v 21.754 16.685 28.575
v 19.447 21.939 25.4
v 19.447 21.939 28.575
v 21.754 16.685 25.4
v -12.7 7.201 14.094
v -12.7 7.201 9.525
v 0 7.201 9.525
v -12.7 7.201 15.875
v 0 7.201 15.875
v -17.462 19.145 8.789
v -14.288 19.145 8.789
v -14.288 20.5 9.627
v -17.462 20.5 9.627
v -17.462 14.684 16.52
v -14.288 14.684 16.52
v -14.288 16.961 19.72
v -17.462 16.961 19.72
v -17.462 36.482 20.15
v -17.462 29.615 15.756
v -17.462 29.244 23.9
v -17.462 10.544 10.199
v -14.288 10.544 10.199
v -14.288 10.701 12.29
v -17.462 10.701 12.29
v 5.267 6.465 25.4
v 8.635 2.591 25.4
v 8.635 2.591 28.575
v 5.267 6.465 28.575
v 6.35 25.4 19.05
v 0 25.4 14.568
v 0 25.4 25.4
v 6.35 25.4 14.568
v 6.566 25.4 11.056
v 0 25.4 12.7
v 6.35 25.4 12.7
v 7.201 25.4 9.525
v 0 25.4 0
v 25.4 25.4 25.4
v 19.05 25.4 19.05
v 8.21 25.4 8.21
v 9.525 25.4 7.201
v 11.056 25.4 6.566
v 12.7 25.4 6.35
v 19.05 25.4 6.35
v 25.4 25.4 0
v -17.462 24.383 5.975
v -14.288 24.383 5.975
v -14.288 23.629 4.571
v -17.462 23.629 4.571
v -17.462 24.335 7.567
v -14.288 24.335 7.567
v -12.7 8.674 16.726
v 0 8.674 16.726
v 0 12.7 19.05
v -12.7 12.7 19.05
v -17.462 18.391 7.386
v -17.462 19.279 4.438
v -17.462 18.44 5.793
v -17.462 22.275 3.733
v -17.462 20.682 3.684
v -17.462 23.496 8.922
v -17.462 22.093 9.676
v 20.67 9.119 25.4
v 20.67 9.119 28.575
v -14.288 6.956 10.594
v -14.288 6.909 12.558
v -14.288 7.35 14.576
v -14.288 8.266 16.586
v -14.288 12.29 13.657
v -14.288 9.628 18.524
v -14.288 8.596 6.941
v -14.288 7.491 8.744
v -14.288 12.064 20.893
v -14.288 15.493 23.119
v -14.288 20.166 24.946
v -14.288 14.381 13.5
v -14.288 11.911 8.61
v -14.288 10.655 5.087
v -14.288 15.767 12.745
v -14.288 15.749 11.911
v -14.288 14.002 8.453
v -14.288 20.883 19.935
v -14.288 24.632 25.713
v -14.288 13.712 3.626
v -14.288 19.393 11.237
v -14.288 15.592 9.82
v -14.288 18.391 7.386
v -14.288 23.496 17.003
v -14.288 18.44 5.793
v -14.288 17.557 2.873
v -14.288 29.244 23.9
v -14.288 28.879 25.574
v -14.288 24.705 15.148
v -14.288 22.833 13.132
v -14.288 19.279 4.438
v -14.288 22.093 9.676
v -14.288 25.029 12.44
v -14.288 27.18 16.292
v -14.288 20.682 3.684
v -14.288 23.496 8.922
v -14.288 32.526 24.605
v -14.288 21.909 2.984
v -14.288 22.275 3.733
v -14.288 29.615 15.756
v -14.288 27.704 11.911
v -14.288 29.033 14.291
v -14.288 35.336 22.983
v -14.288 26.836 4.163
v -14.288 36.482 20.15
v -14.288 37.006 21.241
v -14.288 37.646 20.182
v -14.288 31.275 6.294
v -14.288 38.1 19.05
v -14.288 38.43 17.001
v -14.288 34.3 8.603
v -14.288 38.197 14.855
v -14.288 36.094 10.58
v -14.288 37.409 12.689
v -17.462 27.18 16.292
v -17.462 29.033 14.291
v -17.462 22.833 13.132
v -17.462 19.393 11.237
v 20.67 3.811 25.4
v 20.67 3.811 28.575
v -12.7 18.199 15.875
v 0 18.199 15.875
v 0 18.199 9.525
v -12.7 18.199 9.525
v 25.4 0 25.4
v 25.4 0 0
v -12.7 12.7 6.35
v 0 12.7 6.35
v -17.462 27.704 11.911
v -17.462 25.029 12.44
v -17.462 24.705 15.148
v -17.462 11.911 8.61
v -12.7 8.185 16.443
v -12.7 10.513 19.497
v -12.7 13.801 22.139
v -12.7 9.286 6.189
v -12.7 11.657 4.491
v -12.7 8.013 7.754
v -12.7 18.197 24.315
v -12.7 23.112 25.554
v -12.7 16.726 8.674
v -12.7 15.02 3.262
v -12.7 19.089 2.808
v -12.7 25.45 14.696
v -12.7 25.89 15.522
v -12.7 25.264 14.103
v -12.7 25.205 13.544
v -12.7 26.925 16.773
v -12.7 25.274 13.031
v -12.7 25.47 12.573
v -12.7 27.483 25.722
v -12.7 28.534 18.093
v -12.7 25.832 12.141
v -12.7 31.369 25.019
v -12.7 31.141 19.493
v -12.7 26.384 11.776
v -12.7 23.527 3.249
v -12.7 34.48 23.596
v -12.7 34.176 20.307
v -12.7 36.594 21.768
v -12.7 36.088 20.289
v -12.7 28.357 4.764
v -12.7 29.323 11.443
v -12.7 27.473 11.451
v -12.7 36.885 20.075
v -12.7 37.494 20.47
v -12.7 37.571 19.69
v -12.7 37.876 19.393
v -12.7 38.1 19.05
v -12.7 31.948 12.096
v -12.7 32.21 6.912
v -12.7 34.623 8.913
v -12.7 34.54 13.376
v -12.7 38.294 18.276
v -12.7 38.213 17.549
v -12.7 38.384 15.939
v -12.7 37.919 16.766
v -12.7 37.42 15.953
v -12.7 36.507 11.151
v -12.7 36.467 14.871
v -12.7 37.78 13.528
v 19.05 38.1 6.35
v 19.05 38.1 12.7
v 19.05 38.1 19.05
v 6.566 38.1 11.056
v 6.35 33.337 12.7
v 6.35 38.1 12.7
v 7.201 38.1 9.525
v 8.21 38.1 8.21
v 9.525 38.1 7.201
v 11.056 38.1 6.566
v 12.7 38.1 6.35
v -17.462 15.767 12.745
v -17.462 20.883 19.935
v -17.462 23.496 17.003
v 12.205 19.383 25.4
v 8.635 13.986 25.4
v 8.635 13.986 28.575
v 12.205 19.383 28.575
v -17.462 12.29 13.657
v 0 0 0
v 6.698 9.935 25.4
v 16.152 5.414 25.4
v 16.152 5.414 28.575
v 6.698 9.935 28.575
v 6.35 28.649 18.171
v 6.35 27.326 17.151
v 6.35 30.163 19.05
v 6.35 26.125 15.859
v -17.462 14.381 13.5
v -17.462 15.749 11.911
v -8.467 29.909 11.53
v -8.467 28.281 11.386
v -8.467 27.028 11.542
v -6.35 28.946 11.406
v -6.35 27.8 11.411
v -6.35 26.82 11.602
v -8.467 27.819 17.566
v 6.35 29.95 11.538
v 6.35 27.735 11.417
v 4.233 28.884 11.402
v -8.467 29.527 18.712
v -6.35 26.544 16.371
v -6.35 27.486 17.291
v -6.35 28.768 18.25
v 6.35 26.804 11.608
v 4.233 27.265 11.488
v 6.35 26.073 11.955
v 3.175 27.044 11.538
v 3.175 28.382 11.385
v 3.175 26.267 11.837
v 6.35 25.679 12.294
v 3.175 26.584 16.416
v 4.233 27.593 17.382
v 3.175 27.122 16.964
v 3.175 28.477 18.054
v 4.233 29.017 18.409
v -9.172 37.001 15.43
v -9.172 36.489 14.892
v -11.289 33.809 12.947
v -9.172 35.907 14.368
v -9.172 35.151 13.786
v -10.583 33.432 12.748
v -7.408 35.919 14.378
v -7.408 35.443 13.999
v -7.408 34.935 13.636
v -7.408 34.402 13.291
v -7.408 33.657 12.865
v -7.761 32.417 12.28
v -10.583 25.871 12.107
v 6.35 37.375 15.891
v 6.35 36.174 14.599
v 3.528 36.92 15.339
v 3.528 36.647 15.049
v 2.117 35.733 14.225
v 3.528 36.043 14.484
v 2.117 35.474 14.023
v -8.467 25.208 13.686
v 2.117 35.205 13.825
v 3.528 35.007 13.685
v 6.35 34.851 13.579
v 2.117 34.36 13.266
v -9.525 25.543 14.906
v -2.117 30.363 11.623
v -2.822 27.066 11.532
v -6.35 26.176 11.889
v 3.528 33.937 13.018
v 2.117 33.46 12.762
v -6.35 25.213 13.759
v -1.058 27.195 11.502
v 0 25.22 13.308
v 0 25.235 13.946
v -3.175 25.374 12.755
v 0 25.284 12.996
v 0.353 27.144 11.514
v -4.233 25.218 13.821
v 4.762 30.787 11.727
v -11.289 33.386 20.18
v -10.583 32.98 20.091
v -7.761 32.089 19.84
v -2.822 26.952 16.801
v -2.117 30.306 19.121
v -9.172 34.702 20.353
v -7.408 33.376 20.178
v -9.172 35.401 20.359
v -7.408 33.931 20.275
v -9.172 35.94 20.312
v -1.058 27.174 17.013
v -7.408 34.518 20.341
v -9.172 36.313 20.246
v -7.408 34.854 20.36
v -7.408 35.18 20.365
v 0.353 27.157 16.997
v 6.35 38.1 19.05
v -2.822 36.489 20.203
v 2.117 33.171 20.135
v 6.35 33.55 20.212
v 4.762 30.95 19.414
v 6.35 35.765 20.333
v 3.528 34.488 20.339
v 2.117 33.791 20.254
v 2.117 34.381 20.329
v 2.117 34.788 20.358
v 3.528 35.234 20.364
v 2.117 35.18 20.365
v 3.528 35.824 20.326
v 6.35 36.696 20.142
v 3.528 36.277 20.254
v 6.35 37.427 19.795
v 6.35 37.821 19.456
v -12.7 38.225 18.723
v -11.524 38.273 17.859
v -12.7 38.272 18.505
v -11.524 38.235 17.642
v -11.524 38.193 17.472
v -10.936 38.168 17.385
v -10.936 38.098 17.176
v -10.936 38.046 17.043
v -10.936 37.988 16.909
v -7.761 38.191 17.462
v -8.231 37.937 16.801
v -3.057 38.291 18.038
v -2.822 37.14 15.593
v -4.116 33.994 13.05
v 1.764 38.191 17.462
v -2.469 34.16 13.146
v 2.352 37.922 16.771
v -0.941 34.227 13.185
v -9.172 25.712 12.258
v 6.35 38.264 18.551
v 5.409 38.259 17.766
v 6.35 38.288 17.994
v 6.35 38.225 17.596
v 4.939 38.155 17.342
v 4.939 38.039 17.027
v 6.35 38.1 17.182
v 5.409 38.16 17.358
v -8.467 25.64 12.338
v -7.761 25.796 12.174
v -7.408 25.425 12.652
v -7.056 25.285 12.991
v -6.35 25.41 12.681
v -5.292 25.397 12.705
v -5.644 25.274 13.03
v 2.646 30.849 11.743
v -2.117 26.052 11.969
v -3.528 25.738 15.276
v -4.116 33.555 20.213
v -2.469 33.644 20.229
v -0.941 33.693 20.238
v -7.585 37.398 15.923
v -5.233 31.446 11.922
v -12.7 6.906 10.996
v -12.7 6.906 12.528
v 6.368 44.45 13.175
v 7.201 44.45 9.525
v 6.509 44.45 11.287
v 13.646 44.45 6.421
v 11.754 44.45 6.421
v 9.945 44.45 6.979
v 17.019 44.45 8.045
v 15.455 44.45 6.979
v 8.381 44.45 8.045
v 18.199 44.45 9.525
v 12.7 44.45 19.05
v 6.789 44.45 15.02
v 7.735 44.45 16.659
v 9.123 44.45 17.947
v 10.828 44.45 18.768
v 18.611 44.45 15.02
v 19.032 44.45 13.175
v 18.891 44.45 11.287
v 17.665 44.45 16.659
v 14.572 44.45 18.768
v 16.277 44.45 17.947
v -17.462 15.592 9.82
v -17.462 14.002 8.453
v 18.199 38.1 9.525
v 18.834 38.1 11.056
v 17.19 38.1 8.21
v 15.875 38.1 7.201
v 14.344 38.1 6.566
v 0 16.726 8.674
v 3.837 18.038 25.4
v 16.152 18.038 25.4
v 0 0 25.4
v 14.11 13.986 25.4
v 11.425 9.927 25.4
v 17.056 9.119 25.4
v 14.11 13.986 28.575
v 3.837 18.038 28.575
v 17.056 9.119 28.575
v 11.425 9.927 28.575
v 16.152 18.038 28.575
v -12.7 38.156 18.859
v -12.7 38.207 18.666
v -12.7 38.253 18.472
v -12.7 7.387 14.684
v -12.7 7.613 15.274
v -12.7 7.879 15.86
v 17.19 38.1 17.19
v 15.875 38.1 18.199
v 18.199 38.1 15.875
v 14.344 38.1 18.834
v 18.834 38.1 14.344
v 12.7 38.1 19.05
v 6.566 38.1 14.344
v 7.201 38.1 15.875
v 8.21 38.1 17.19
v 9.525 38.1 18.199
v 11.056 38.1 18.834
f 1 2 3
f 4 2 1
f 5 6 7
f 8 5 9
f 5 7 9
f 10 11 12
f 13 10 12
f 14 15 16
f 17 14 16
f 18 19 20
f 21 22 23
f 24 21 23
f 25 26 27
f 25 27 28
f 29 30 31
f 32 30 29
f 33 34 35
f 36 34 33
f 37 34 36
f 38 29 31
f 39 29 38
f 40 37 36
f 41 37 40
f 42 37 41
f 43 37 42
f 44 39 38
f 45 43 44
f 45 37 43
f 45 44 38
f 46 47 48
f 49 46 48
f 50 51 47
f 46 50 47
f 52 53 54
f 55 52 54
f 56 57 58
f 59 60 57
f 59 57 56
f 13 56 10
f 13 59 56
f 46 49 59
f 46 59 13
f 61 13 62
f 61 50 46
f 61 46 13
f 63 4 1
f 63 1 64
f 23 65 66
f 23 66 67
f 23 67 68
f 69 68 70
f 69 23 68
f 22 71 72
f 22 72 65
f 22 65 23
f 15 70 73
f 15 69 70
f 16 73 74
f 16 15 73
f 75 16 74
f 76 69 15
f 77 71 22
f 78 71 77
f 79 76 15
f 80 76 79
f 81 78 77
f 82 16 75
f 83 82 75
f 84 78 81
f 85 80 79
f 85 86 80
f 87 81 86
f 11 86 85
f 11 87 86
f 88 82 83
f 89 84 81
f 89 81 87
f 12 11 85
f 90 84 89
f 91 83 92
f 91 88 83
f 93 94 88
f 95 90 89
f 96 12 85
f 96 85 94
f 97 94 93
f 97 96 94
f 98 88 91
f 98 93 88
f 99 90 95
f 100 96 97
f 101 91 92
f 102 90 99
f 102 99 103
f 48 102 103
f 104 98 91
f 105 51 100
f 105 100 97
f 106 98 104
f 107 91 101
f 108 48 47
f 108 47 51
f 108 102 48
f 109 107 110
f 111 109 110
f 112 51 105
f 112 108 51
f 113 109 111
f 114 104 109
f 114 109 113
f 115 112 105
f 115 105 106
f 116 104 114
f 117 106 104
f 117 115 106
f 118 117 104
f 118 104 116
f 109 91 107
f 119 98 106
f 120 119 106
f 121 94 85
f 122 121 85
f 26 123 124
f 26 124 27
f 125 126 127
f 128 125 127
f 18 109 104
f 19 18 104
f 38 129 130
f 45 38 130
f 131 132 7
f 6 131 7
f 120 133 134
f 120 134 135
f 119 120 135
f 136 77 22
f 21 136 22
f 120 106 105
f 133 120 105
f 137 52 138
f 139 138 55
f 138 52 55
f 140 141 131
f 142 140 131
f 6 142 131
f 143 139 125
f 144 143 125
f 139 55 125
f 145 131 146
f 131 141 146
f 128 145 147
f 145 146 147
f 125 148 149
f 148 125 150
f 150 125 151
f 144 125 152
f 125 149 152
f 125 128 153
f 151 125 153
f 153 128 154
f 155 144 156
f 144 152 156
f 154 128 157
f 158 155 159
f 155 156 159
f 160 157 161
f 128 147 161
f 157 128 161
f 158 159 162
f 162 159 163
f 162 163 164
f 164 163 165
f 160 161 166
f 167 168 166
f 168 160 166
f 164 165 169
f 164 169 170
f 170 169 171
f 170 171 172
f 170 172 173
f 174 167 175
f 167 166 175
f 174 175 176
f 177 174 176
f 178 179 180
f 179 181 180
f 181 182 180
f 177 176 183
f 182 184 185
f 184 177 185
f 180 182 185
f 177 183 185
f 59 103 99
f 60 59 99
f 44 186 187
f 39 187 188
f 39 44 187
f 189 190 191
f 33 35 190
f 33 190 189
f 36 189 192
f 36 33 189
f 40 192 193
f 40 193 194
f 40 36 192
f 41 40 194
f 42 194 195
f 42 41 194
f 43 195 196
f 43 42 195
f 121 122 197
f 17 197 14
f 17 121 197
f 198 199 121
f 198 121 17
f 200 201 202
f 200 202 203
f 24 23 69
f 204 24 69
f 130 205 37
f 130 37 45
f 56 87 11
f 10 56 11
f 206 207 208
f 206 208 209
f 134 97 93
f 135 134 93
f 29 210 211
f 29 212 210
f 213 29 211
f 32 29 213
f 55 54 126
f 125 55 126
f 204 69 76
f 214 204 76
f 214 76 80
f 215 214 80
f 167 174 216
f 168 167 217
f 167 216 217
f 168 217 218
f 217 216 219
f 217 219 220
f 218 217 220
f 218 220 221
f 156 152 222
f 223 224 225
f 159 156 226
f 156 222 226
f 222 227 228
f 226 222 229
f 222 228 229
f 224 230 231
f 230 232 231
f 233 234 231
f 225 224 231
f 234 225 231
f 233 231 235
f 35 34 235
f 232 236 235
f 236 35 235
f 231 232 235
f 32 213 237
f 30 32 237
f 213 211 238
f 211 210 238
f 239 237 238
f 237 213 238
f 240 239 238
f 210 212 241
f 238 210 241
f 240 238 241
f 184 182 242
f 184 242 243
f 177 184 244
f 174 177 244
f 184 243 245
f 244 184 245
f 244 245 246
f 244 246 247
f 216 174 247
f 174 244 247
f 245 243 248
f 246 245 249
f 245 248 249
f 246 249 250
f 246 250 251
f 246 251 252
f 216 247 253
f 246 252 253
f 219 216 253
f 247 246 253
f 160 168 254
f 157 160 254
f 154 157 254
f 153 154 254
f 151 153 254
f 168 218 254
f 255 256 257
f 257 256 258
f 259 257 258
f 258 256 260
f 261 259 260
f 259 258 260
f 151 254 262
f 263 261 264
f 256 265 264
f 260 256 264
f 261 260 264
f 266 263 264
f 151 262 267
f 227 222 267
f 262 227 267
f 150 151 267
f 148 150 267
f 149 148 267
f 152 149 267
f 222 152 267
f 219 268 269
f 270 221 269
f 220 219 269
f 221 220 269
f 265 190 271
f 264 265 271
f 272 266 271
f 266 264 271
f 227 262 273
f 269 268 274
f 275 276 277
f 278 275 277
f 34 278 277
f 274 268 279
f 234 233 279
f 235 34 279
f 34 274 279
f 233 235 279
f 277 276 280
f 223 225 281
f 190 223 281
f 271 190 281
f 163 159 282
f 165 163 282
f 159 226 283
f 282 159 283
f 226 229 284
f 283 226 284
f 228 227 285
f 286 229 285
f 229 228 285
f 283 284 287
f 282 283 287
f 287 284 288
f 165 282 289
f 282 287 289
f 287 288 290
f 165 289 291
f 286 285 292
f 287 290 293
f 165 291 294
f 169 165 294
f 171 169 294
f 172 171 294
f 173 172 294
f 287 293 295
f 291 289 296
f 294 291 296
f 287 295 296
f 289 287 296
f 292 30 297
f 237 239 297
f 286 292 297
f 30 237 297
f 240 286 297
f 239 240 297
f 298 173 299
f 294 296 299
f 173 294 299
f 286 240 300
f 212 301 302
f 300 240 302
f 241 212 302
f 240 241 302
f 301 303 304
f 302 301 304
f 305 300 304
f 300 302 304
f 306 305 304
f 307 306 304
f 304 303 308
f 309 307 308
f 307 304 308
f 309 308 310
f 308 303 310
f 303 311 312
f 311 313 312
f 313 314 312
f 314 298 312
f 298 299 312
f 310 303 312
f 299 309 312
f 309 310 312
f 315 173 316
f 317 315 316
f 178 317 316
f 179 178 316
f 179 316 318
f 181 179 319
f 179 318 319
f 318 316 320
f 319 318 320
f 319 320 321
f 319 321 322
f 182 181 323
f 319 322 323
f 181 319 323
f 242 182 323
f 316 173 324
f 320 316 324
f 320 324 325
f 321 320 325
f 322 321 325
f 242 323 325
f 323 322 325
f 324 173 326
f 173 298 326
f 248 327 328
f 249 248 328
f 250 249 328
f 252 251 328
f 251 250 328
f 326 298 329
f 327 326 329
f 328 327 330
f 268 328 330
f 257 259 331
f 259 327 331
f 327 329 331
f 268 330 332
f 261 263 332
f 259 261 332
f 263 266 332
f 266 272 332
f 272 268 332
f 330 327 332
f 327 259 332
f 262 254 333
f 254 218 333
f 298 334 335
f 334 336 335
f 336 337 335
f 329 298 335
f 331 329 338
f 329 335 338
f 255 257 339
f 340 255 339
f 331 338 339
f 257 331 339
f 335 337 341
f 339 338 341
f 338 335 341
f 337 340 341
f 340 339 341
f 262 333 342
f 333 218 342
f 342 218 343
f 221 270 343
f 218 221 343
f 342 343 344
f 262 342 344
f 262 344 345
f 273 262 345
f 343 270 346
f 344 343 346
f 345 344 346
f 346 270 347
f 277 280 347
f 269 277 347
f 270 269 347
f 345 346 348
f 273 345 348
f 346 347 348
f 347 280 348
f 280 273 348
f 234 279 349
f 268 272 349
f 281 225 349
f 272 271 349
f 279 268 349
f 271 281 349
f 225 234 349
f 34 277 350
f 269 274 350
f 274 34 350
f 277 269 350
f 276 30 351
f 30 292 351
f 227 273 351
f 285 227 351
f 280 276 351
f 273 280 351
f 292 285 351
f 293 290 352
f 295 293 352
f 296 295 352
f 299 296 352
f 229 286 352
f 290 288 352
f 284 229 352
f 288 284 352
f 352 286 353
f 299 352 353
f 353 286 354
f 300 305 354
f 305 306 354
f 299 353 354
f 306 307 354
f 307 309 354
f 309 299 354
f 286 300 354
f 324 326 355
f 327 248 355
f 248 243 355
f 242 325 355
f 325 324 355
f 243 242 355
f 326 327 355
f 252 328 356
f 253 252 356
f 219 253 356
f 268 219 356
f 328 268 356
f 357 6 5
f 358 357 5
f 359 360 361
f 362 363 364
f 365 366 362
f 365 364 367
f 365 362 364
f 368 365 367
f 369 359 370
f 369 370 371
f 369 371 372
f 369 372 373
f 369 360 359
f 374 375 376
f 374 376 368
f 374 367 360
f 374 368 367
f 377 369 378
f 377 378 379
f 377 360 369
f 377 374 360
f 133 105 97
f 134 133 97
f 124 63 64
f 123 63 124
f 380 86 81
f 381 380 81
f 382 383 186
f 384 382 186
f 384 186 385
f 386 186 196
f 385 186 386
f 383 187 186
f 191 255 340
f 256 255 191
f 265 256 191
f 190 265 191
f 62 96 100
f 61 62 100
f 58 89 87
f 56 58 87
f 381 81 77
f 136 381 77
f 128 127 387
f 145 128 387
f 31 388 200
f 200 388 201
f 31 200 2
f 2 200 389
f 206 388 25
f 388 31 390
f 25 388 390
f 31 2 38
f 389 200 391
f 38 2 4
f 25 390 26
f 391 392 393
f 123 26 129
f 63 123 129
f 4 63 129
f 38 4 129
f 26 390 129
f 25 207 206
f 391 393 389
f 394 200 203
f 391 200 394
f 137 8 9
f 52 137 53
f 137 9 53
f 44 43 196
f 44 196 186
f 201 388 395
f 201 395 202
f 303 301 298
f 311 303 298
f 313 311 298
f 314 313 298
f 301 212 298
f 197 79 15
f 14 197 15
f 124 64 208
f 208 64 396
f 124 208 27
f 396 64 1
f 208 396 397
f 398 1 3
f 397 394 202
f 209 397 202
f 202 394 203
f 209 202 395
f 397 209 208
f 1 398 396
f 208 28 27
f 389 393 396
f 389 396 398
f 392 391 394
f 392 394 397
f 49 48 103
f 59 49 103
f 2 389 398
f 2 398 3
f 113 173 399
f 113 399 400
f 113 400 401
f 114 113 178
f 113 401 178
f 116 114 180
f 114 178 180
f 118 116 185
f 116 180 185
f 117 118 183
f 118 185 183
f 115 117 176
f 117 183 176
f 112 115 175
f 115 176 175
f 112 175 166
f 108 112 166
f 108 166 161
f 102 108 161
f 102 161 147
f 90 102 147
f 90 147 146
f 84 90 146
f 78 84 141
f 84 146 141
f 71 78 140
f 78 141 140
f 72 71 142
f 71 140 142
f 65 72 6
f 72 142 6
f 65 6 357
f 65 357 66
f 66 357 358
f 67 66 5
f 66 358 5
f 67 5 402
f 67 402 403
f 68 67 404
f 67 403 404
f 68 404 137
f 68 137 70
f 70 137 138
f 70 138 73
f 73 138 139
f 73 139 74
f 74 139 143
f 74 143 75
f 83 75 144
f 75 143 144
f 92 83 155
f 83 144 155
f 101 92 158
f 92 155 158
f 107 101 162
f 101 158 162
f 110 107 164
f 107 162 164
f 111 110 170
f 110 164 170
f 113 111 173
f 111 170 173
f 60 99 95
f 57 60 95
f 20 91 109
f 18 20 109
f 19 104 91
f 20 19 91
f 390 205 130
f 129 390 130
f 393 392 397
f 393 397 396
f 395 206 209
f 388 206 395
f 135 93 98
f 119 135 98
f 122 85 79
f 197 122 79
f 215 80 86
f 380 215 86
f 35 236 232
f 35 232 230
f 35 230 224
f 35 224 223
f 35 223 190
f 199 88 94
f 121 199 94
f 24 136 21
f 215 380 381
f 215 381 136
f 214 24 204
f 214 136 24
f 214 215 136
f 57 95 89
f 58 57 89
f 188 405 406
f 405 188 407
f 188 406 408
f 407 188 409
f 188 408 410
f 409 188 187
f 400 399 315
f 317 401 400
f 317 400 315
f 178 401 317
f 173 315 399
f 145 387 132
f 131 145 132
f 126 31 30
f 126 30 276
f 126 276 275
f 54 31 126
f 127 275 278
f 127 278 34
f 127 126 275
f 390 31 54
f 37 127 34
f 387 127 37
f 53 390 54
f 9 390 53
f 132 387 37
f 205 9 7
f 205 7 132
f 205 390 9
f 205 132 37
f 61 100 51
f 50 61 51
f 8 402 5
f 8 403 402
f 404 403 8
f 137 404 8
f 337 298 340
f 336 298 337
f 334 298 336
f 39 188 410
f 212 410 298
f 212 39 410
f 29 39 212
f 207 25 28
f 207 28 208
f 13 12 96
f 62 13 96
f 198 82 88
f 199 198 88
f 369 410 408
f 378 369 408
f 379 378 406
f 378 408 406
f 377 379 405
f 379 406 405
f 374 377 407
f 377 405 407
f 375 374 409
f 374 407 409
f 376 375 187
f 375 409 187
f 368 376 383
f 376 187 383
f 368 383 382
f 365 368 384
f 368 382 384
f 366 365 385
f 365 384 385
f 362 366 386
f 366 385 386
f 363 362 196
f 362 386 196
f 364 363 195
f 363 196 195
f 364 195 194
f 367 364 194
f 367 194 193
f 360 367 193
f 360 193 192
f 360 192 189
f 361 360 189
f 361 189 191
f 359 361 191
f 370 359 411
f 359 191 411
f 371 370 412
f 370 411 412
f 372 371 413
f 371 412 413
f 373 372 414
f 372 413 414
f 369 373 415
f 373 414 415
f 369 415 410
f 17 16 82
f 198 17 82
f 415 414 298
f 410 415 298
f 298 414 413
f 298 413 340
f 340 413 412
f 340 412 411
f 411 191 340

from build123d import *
from build123d.topology import SkipClean

# Parameters (mm, degrees)
SKETCH1_W           = 25.4
SKETCH1_H           = 25.4
BOSS_EXTRUDE1_DEPTH = 25.4
BOSS_EXTRUDE2_DEPTH = 12.7
SKETCH3_R           = 6.35
BOSS_EXTRUDE3_DEPTH = 6.35
SKETCH4_RX          = 7.099515829
SKETCH4_RY          = 3.549757914
BOSS_EXTRUDE4_DEPTH = 19.05
BOSS_EXTRUDE5_DEPTH = 12.7
SKETCH6_RX          = 16.167018701
SKETCH6_RY          = 10.929819125
BOSS_EXTRUDE6_DEPTH = 1.5875
BOSS_EXTRUDE7_DEPTH = 3.175
BOSS_EXTRUDE8_DEPTH = 3.175


with BuildPart() as part:
    # Sketch1 → Boss-Extrude1 (new body)
    with BuildSketch(Plane(origin=(0, 0, 0), x_dir=(1, 0, 0), z_dir=(0, 1, 0))):
        with Locations((12.7, -12.7)):
            Rectangle(SKETCH1_W, SKETCH1_H)
    extrude(amount=BOSS_EXTRUDE1_DEPTH)

    # Sketch2 → Boss-Extrude2 (add)
    with BuildSketch(Plane(origin=(0, 25.4, 0), x_dir=(1, 0, 0), z_dir=(0, 1, 0))):
        with BuildLine():
            ThreePointArc((6.35, -12.7), (8.209871939, -8.209871939), (12.7, -6.35))
            Line((12.7, -6.35), (19.05, -6.35))
            Line((19.05, -6.35), (19.05, -19.05))
            Line((19.05, -19.05), (6.35, -19.05))
            Line((6.35, -19.05), (6.35, -12.7))
        make_face()
    extrude(amount=BOSS_EXTRUDE2_DEPTH)

    # Sketch3 → Boss-Extrude3 (add)
    with SkipClean():  # keep this step's faces unmerged: merging them makes the solid invalid here
        with BuildSketch(Plane(origin=(0, 38.1, 0), x_dir=(1, 0, 0), z_dir=(0, 1, 0))):
            with Locations(Location((12.7, -12.7, 0), (0, 0, 270))):  # turned: the seam where the file's is
                Circle(SKETCH3_R)
        extrude(amount=BOSS_EXTRUDE3_DEPTH)

    # Sketch4 → Boss-Extrude4 (add)
    with SkipClean():  # keep this step's faces unmerged: merging them makes the solid invalid here
        with BuildSketch(Plane.ZY.offset(-6.35)):
            with Locations(Location((15.875, 31.75), (0, 0, 63.434948823))):
                Ellipse(SKETCH4_RX, SKETCH4_RY)
        extrude(amount=BOSS_EXTRUDE4_DEPTH)

    # Sketch5 → Boss-Extrude5 (add)
    with SkipClean():  # keep this step's faces unmerged: merging them makes the solid invalid here
        with BuildSketch(Plane.ZY):
            Polygon((9.525, 18.199261314), (8.674261314, 16.725738686), (16.725738686, 8.674261314), (19.05, 12.7), (15.875, 18.199261314), align=None)
            Polygon((16.725738686, 8.674261314), (8.674261314, 16.725738686), (6.35, 12.7), (9.525, 7.200738686), (15.875, 7.200738686), align=None)
        extrude(amount=BOSS_EXTRUDE5_DEPTH)

    # Sketch6 → Boss-Extrude6 (add)
    with SkipClean():  # keep this step's faces unmerged: merging them makes the solid invalid here
        with BuildSketch(Plane.ZY.offset(12.7)):
            with Locations(Location((14.2875, 22.650369343), (0, 0, 72.867573148))):
                Ellipse(SKETCH6_RX, SKETCH6_RY)
        extrude(amount=BOSS_EXTRUDE6_DEPTH)

    # Sketch7 → Boss-Extrude7 (add)
    with SkipClean():  # keep this step's faces unmerged: merging them makes the solid invalid here
        with BuildSketch(Plane.ZY.offset(14.2875)):
            Polygon((4.571396825, 23.629289358), (3.732973033, 22.274531466), (3.684255675, 20.682064819), (4.43829853, 19.27858957), (5.793056422, 18.440165778), (7.385523068, 18.391448421), (8.788998317, 19.145491275), (9.627422109, 20.500249167), (9.676139467, 22.092715813), (8.922096612, 23.496191063), (7.56733872, 24.334614855), (5.974872074, 24.383332212), align=None)
            Polygon((9.820093329, 15.591599788), (8.452601667, 14.002128498), (8.609564967, 11.911239943), (10.199036257, 10.54374828), (12.289924812, 10.70071158), (13.657416475, 12.290182871), (13.500453174, 14.381071426), (11.910981884, 15.748563088), align=None)
            Polygon((11.910981884, 27.703541882), (12.440145656, 25.02865315), (15.147636613, 24.705331728), (16.291794276, 27.18039683), (14.291431644, 29.033392611), align=None)
            Polygon((17.003134649, 23.496191063), (13.132029933, 22.83322326), (11.236764719, 19.393318057), (12.744512372, 15.766794232), (16.519908155, 14.684498193), (19.72000204, 16.961420933), (19.935058062, 20.882993187), align=None)
            Polygon((15.755915704, 29.615083354), (23.899741704, 29.243629963), (20.149516777, 36.482116859), align=None)
        extrude(amount=BOSS_EXTRUDE7_DEPTH)

    # Sketch8 → Boss-Extrude8 (add)
    with SkipClean():  # keep this step's faces unmerged: merging them makes the solid invalid here
        with BuildSketch(Plane.XY.offset(25.4)):
            Polygon((16.152157776, 5.413552829), (6.697554447, 9.934608829), (3.837078483, 18.037710904), (8.634948169, 13.986159866), (12.205224218, 19.382989208), (14.110358878, 13.986159866), (11.424856112, 9.926753835), (17.056057389, 9.119429964), (16.152157776, 18.037710904), (19.446911767, 21.939377241), (21.754376792, 16.684574537), (20.669790839, 9.119429964), (20.669790839, 3.810761102), (8.634948169, 2.590986831), (5.267316465, 6.465095533), align=None)
        extrude(amount=BOSS_EXTRUDE8_DEPTH)


solid = part.part
